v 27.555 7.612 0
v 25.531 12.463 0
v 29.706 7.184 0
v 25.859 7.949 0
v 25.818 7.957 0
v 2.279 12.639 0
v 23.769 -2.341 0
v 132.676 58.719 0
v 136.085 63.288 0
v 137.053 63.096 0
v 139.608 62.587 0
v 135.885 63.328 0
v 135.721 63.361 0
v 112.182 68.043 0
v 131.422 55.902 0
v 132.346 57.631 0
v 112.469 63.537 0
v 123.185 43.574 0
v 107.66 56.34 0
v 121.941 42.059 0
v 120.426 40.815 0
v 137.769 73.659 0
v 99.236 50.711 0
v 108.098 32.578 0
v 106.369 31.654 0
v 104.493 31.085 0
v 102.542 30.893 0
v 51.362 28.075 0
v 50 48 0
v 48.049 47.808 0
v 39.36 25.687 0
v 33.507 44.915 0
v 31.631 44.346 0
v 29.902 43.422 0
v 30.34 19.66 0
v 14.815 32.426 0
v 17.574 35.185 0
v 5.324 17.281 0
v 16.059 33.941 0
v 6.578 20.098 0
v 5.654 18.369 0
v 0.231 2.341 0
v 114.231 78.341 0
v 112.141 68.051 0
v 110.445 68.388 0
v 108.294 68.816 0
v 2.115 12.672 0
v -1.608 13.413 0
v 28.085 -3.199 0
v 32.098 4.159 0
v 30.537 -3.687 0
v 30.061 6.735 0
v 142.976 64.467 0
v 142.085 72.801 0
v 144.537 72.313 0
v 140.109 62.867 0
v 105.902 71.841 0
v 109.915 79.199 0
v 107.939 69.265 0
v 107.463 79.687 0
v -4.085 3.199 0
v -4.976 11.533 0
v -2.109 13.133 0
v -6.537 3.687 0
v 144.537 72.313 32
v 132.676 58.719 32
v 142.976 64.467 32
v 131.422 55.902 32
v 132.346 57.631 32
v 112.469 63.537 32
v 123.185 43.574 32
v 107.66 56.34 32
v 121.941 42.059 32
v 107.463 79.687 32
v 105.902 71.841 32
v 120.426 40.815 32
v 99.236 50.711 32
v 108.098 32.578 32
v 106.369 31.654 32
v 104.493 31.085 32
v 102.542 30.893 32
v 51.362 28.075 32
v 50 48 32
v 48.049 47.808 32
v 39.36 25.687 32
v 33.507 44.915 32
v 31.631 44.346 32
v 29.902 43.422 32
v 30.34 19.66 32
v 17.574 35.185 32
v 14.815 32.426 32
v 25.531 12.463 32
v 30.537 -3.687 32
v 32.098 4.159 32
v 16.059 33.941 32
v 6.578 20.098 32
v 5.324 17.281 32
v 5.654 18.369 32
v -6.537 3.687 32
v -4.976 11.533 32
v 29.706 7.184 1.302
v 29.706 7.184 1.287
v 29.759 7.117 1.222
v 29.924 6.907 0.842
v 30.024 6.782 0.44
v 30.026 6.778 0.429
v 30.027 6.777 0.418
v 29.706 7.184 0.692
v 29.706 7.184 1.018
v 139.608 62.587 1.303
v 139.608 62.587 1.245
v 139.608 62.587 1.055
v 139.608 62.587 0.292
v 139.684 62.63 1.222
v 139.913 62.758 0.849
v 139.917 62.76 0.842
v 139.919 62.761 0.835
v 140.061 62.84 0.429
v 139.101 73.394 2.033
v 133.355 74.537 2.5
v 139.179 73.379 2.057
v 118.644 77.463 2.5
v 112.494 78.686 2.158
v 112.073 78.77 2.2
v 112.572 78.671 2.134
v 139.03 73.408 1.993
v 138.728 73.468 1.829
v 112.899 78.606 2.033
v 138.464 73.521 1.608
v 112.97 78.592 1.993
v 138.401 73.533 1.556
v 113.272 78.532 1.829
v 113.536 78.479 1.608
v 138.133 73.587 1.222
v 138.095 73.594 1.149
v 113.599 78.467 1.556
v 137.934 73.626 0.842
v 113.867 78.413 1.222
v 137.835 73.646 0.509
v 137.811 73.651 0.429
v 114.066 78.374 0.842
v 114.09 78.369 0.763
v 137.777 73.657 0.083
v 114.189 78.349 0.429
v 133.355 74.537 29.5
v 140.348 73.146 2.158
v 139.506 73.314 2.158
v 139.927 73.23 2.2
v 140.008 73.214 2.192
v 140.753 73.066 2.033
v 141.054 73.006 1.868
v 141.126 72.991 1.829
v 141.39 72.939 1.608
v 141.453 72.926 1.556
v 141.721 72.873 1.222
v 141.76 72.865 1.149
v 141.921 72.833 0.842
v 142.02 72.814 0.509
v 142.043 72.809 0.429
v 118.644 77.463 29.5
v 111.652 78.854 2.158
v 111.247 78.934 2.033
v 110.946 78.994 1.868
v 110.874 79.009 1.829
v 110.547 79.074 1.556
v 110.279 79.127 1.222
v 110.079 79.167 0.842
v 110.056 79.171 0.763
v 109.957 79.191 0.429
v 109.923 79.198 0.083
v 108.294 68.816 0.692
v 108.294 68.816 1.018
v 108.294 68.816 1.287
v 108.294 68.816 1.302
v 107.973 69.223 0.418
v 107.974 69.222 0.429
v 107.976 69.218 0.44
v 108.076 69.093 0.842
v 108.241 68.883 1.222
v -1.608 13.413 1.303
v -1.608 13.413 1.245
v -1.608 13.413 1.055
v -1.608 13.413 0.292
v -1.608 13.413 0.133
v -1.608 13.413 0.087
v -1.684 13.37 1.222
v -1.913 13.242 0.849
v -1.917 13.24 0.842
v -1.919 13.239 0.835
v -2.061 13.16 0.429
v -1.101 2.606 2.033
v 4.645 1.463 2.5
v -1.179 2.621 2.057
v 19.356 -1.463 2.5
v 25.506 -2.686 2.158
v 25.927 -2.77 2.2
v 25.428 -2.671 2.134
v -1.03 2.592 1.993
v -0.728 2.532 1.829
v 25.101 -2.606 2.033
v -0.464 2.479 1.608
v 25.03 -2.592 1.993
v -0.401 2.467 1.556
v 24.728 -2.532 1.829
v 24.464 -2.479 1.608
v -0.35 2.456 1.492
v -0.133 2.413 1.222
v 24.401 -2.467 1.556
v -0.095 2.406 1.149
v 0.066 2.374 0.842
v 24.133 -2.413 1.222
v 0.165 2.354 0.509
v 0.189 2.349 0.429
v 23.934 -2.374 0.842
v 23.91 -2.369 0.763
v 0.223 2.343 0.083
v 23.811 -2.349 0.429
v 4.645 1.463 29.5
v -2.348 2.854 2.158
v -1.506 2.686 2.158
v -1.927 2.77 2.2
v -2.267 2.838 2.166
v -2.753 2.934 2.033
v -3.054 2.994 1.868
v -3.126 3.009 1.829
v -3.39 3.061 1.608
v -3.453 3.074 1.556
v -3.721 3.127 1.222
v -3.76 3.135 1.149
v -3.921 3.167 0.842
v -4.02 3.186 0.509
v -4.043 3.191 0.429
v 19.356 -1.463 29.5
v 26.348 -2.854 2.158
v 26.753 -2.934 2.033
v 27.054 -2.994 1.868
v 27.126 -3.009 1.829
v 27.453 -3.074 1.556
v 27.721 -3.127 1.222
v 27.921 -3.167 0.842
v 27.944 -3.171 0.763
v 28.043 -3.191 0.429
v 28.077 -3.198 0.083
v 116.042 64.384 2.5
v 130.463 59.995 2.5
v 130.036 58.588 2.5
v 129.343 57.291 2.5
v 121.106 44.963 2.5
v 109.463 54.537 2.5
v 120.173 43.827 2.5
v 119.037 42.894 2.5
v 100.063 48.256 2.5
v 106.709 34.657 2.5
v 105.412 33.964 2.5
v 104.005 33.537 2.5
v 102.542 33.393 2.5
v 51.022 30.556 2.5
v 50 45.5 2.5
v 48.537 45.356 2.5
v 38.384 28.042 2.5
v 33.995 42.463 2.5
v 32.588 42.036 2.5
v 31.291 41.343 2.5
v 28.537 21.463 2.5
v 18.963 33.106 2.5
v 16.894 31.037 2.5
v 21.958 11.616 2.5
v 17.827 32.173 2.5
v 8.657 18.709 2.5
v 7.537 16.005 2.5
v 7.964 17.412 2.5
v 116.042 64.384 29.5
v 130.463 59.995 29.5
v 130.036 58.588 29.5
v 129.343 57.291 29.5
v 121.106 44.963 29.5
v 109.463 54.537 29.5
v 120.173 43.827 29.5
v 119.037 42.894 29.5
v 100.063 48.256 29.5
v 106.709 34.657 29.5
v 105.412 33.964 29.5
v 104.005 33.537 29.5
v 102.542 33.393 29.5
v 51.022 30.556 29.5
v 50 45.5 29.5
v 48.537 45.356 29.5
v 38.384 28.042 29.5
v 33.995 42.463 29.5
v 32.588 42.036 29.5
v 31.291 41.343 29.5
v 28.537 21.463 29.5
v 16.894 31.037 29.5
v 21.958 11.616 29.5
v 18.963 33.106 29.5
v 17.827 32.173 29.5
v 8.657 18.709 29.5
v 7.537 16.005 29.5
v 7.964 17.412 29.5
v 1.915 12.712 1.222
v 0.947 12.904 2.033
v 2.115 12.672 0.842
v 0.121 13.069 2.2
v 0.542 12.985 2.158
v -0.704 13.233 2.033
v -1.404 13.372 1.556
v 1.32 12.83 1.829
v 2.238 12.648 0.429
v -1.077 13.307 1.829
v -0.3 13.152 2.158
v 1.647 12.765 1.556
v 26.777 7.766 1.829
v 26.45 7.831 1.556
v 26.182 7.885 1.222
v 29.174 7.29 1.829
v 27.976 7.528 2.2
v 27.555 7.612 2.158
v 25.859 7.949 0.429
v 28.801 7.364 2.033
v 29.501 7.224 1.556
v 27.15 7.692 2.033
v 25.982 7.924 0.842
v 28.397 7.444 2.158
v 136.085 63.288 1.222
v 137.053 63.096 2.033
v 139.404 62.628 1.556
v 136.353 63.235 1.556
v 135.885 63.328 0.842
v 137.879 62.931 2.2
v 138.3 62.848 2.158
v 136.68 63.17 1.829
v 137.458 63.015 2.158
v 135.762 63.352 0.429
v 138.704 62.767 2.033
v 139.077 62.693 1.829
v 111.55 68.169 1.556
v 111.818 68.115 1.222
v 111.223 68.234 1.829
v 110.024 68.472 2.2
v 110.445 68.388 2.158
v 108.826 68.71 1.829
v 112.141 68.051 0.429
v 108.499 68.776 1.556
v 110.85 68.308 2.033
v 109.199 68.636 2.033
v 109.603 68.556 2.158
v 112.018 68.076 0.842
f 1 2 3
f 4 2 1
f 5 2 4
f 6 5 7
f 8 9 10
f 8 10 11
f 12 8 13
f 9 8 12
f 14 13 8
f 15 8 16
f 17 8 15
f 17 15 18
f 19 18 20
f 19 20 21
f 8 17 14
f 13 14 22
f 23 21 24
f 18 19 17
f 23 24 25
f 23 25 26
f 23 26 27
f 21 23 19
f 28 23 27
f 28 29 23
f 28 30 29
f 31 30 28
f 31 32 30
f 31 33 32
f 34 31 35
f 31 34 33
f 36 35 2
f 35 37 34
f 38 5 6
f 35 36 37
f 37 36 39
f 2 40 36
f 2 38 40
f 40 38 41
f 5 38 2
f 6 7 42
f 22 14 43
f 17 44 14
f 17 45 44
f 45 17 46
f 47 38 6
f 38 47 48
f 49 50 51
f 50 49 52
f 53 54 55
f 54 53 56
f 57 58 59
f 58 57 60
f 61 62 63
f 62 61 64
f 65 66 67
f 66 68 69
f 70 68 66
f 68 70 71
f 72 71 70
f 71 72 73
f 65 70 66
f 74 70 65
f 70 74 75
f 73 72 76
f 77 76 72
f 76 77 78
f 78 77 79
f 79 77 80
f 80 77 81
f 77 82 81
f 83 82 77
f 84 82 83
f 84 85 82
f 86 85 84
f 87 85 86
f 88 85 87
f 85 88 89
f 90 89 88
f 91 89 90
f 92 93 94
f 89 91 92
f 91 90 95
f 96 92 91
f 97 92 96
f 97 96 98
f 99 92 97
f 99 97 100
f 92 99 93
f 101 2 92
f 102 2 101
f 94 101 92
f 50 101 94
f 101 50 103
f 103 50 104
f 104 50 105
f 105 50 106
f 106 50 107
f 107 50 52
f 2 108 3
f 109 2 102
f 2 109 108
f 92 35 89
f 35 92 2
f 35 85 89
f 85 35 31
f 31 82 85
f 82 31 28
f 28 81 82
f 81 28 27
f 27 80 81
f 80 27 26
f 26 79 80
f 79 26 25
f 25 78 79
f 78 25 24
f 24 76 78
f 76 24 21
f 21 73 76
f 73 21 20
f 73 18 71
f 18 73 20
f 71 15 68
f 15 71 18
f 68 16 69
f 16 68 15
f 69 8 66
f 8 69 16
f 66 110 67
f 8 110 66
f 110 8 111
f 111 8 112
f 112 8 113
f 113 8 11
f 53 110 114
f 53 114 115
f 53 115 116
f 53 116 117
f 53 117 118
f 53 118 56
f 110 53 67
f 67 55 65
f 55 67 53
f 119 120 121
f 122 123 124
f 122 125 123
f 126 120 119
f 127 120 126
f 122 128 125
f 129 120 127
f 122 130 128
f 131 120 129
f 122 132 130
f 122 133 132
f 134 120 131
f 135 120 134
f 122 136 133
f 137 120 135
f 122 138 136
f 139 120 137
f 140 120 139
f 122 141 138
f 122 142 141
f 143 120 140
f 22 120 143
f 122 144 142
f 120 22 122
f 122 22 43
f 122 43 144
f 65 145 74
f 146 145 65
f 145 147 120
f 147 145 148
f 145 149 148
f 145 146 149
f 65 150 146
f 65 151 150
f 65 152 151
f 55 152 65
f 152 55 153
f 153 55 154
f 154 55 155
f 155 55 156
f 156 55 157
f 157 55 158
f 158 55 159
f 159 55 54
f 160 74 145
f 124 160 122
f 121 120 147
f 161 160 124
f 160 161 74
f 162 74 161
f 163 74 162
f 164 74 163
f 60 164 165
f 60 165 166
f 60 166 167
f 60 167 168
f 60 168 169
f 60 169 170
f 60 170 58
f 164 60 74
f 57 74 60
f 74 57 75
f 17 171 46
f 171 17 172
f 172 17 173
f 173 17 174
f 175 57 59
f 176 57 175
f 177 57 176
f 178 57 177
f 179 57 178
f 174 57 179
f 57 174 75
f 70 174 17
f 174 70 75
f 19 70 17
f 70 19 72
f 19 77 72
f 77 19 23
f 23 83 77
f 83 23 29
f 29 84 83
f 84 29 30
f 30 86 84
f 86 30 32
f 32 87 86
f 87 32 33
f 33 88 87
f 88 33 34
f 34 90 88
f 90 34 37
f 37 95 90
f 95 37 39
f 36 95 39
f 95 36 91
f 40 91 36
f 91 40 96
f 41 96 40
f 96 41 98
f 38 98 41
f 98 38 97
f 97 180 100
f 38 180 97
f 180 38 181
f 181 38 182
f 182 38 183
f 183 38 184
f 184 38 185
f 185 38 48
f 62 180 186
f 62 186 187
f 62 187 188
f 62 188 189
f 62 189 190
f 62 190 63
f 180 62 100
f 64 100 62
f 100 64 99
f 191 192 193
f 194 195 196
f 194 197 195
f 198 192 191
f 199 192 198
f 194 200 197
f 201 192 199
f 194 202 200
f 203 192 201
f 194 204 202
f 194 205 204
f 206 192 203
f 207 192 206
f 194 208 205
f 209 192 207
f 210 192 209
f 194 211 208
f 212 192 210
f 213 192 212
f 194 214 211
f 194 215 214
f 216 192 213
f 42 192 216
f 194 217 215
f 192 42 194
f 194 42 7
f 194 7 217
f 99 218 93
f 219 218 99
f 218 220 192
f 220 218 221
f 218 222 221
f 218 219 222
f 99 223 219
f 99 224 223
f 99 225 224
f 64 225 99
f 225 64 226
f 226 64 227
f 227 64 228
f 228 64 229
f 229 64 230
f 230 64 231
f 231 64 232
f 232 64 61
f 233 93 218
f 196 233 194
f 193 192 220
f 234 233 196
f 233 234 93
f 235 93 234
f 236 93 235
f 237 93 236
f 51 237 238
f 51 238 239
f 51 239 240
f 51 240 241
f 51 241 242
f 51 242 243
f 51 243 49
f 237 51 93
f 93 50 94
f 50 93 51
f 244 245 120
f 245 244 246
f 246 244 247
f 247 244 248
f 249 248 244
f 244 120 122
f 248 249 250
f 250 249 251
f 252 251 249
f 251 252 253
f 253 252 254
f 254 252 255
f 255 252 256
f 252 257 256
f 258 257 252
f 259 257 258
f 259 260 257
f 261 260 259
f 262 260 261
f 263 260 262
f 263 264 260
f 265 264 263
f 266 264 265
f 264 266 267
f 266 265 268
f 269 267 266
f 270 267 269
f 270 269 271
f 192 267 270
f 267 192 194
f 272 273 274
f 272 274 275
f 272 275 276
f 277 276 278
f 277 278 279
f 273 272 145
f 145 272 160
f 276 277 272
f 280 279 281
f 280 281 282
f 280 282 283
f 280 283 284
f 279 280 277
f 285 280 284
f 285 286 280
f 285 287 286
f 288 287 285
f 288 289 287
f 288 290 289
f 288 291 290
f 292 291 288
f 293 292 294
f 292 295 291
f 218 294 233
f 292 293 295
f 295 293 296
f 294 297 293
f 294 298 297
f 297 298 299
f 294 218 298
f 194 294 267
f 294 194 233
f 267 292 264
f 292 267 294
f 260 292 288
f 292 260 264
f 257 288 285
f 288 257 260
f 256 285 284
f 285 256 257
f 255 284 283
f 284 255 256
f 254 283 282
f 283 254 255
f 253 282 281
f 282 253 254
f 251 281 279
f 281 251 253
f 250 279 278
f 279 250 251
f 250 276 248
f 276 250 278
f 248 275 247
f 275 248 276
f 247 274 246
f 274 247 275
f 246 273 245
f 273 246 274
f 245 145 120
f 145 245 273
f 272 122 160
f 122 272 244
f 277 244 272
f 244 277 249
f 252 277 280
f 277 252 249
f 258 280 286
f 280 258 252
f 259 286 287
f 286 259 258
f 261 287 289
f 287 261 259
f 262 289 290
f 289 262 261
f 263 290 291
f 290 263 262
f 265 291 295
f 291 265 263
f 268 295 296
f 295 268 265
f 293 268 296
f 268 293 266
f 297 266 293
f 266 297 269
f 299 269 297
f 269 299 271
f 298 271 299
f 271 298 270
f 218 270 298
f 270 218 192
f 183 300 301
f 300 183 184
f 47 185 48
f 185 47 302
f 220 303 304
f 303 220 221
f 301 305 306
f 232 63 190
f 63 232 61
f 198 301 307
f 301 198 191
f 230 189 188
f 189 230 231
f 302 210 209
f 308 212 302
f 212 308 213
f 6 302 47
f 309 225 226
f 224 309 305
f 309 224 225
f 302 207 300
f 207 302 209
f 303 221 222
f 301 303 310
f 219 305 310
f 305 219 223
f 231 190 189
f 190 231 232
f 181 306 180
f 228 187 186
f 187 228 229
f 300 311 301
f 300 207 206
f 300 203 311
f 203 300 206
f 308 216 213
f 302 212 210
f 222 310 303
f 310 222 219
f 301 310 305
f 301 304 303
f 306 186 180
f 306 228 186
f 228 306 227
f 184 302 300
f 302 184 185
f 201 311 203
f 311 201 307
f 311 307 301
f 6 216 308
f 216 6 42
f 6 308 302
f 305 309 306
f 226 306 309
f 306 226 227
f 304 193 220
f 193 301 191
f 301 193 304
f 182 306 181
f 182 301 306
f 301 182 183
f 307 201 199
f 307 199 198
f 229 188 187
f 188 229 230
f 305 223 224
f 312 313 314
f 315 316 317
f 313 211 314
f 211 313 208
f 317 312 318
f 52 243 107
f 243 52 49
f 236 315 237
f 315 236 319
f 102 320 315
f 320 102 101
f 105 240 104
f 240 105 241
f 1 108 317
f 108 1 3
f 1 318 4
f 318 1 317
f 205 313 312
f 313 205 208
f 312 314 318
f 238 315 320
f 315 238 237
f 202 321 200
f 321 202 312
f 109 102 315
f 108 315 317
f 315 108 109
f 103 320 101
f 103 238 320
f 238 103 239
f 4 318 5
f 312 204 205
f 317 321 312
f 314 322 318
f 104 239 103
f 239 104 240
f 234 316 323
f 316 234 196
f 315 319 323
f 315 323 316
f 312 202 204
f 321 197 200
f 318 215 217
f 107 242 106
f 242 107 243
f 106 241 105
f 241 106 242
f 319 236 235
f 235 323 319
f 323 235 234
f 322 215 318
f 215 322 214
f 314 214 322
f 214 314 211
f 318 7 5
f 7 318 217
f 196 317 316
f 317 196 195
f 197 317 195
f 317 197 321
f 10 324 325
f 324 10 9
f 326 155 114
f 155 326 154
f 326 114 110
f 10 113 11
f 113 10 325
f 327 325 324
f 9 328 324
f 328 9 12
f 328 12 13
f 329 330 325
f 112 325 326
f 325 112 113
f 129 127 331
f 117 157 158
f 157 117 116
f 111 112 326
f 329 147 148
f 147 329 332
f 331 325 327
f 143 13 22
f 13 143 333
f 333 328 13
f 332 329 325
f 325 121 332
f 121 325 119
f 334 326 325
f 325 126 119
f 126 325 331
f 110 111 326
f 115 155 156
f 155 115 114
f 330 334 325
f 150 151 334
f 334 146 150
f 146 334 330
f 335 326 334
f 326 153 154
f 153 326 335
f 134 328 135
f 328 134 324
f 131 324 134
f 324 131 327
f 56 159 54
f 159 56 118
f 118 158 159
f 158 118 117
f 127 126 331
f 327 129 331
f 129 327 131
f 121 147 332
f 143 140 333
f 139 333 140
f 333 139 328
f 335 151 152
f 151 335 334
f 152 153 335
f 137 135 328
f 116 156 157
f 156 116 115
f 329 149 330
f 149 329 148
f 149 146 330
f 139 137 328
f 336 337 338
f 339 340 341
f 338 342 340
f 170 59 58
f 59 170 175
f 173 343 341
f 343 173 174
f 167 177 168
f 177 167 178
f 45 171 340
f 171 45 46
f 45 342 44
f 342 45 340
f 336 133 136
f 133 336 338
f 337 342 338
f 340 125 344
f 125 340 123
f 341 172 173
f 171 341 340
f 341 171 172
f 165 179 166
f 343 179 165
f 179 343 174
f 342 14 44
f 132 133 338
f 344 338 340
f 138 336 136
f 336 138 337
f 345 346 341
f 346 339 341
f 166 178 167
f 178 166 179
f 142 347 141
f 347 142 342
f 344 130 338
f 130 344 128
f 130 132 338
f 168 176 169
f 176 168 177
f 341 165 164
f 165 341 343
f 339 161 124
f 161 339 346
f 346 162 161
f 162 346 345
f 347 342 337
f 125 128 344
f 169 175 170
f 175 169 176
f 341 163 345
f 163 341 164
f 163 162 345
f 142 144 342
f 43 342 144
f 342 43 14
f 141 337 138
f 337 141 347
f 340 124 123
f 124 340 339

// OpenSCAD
$fn = 32;

// ----------------------------------------------------------------------
// Air duct: 20 mm duct, 2.5 mm wall, 32 mm across
// ----------------------------------------------------------------------

// --- parameters (mm) ---
duct_r = 10;              // duct core radius
duct_d = 20;              // duct core diameter
wall = 2.5;               // duct wall thickness
height = 32;              // duct width (extrusion height)
port_r = 18.9;            // port flange half width
port_d = 37.8;            // port flange width
port_t = 8;               // port flange thickness
bolt_d = 4.4;             // port bolt holes
bolt_offset = 14.2;       // bolt hole offset from the port axis

difference() {
  /* outer hull chain: tube with a flat flange plate at every port */
  linear_extrude(height = 32) {
    hull() {
      polygon([[30.537, -3.687], [-6.537, 3.687], [-4.976, 11.533], [32.098, 4.159]]);
      translate([14.146, 10.789]) circle(r = 10);
    }
    hull() {
      translate([14.146, 10.789]) circle(r = 10);
      translate([14.893, 14.542]) circle(r = 10);
    }
    hull() {
      translate([14.893, 14.542]) circle(r = 10);
      translate([23.13, 26.87]) circle(r = 10);
    }
    hull() {
      translate([23.13, 26.87]) circle(r = 10);
      translate([35.458, 35.107]) circle(r = 10);
    }
    hull() {
      translate([35.458, 35.107]) circle(r = 10);
      translate([50, 38]) circle(r = 10);
    }
    hull() {
      translate([50, 38]) circle(r = 10);
      translate([102.542, 40.893]) circle(r = 10);
    }
    hull() {
      translate([102.542, 40.893]) circle(r = 10);
      translate([114.87, 49.13]) circle(r = 10);
    }
    hull() {
      translate([114.87, 49.13]) circle(r = 10);
      translate([123.107, 61.458]) circle(r = 10);
    }
    hull() {
      translate([123.107, 61.458]) circle(r = 10);
      translate([123.854, 65.211]) circle(r = 10);
    }
    hull() {
      translate([123.854, 65.211]) circle(r = 10);
      polygon([[107.463, 79.687], [144.537, 72.313], [142.976, 64.467], [105.902, 71.841]]);
    }
  }
  /* air passage: the same chain inset by the wall, 5 mm proud of the ports */
  translate([0, 0, 2.5]) linear_extrude(height = 27) {
    hull() {
      translate([11.025, -4.904]) circle(r = 7.5);
      translate([14.893, 14.542]) circle(r = 7.5);
    }
    hull() {
      translate([14.893, 14.542]) circle(r = 7.5);
      translate([23.13, 26.87]) circle(r = 7.5);
    }
    hull() {
      translate([23.13, 26.87]) circle(r = 7.5);
      translate([35.458, 35.107]) circle(r = 7.5);
    }
    hull() {
      translate([35.458, 35.107]) circle(r = 7.5);
      translate([50, 38]) circle(r = 7.5);
    }
    hull() {
      translate([50, 38]) circle(r = 7.5);
      translate([102.542, 40.893]) circle(r = 7.5);
    }
    hull() {
      translate([102.542, 40.893]) circle(r = 7.5);
      translate([114.87, 49.13]) circle(r = 7.5);
    }
    hull() {
      translate([114.87, 49.13]) circle(r = 7.5);
      translate([123.107, 61.458]) circle(r = 7.5);
    }
    hull() {
      translate([123.107, 61.458]) circle(r = 7.5);
      translate([126.975, 80.904]) circle(r = 7.5);
    }
  }
  translate([12, 0]) rotate([0, 0, -11.25]) translate([-14.2, -2.5]) rotate([-90, 0, 0]) cylinder(h = 13, d = 4.4);
  translate([12, 0]) rotate([0, 0, -11.25]) translate([14.2, -2.5]) rotate([-90, 0, 0]) cylinder(h = 13, d = 4.4);
  translate([126, 76]) rotate([0, 0, 168.75]) translate([-14.2, -2.5]) rotate([-90, 0, 0]) cylinder(h = 13, d = 4.4);
  translate([126, 76]) rotate([0, 0, 168.75]) translate([14.2, -2.5]) rotate([-90, 0, 0]) cylinder(h = 13, d = 4.4);
}
